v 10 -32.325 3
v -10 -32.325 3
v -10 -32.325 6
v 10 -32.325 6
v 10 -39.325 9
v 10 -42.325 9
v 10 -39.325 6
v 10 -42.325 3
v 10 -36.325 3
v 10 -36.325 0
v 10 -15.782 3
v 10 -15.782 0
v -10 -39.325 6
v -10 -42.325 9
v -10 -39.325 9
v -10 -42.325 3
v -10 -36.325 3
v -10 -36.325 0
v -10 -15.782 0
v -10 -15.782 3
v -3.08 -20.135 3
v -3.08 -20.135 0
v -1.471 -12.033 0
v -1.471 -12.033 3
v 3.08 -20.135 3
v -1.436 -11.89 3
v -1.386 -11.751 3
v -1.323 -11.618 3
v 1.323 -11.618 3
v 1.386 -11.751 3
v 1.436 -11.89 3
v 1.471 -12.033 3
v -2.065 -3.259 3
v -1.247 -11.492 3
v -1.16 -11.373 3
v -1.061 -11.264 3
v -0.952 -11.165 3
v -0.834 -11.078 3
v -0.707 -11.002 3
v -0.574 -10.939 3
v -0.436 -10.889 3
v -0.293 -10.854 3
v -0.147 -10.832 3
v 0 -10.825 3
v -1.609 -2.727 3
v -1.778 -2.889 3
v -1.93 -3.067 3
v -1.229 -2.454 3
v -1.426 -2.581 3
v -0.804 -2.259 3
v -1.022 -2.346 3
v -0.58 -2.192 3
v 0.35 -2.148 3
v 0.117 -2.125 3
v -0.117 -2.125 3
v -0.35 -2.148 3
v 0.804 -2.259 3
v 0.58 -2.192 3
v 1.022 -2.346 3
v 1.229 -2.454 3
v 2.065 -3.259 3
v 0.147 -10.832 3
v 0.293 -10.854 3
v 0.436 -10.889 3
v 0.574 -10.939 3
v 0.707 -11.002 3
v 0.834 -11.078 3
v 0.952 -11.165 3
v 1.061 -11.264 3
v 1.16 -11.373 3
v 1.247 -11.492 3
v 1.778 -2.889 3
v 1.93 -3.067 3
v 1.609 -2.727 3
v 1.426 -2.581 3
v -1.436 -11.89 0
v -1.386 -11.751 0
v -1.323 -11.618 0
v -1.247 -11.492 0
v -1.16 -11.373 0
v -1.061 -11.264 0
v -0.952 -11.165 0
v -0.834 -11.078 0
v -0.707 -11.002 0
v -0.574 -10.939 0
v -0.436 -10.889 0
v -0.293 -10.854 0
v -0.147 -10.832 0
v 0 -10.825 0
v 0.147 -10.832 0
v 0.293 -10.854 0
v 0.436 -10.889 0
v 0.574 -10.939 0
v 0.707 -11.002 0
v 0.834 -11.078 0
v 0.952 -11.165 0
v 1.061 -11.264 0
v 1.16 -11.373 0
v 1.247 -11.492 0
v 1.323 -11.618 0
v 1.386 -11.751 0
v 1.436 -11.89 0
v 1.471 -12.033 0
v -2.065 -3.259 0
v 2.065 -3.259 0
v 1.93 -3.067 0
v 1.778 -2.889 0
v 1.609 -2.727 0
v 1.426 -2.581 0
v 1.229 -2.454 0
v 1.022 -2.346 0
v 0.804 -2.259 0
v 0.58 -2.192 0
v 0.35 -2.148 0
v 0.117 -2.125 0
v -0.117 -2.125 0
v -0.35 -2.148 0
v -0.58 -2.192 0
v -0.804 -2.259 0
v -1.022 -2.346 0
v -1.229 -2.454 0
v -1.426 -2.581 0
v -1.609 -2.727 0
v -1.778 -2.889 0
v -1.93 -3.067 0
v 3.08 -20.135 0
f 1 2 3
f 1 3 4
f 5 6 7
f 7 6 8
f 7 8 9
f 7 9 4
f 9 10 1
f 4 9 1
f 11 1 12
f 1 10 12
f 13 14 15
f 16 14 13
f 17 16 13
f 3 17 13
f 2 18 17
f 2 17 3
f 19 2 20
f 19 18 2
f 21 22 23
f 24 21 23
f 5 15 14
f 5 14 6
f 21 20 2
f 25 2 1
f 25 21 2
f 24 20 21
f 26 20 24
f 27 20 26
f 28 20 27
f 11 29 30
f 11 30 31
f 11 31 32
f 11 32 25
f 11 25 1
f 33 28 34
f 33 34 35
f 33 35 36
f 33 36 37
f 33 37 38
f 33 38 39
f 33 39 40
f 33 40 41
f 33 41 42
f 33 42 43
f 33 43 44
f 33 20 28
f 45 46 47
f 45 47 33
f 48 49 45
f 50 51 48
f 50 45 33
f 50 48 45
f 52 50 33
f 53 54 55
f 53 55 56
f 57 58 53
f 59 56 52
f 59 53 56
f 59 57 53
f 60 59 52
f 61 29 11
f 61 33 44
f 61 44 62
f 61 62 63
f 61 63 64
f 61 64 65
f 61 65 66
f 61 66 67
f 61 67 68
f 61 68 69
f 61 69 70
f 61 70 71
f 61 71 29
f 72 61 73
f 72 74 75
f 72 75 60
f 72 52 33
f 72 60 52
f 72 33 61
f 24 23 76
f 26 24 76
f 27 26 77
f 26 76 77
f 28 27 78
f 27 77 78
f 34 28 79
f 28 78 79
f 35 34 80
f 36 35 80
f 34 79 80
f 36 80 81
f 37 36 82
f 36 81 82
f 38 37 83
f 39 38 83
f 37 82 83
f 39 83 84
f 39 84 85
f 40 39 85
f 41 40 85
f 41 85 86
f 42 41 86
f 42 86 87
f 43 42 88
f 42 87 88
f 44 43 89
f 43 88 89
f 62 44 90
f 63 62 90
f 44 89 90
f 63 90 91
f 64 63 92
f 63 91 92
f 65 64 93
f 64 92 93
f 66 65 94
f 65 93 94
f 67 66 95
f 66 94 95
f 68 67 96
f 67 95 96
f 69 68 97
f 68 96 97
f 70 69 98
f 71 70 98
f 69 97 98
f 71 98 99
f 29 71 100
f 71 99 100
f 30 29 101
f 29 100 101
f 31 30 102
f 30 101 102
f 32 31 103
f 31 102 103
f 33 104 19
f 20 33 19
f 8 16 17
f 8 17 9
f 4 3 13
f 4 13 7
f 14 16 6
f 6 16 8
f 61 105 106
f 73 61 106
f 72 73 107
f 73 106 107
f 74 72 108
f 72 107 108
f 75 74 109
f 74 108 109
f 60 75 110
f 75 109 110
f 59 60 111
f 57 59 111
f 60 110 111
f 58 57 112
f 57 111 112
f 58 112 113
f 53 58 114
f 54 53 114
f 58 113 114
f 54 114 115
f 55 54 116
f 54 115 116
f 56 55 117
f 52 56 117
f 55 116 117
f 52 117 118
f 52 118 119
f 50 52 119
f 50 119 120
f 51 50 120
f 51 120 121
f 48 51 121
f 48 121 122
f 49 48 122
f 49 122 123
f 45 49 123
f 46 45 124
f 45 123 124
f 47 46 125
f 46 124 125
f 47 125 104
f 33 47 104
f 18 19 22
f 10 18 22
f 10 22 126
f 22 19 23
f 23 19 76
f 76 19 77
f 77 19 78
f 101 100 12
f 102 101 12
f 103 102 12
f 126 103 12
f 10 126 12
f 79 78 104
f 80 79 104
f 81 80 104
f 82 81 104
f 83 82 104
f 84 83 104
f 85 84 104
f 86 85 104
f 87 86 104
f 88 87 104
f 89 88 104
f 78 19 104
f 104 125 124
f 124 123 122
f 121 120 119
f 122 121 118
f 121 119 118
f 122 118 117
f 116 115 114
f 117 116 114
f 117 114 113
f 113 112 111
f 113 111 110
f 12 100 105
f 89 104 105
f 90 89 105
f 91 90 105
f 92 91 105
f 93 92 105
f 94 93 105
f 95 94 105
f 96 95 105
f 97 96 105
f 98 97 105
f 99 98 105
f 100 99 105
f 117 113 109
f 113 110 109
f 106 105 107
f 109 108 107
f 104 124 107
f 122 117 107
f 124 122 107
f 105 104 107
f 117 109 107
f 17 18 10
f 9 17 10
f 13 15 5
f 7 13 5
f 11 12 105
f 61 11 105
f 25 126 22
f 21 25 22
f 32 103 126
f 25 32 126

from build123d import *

# Parameters (mm, degrees)
F1_DEPTH = 3
F2_W     = 20
F2_H     = 10
F3_DEPTH = 6
F4_W     = 20
F4_H     = 6
F5_DEPTH = 3
F6_W     = 20
F6_H     = 7
F7_DEPTH = 3


with BuildPart() as f1:
    # F0 (on Top) → F1 (new body)
    with BuildSketch(Plane.XY):
        with BuildLine():
            ThreePointArc((2.064754, -3.25858), (0, -2.122529), (-2.064754, -3.25858))
            Line((-2.064754, -3.25858), (-10, -15.781926))
            Line((-10, -15.781926), (-10, -42.324677))
            Line((-10, -42.324677), (0, -42.324677))
            Line((0, -42.324677), (10, -42.324677))
            Line((10, -42.324677), (10, -15.781926))
            Line((10, -15.781926), (2.064754, -3.25858))
        make_face()
        with BuildLine():
            ThreePointArc((-1.471273, -12.032518), (0, -10.824677), (1.471273, -12.032518))
            Line((1.471273, -12.032518), (3.080257, -20.135145))
            Line((3.080257, -20.135145), (-3.080257, -20.135145))
            Line((-3.080257, -20.135145), (-1.471273, -12.032518))
        make_face(mode=Mode.SUBTRACT)
    extrude(amount=F1_DEPTH)

    # F2 (on face) → F3 (join)
    with BuildSketch(Plane.XY.offset(3)):
        with Locations((0, -37.324677)):
            Rectangle(F2_W, F2_H)
    extrude(amount=F3_DEPTH)

    # F4 (on face) → F5 (cut)
    with BuildSketch(Plane(origin=(0, 0, 0), x_dir=(1, 0, 0), z_dir=(0, 0, -1))):
        with Locations((0, 39.324677)):
            Rectangle(F4_W, F4_H)
    extrude(amount=-F5_DEPTH, mode=Mode.SUBTRACT)

    # F6 (on face) → F7 (cut)
    with BuildSketch(Plane.XY.offset(9)):
        with Locations((0, -35.824677)):
            Rectangle(F6_W, F6_H)
    extrude(amount=-F7_DEPTH, mode=Mode.SUBTRACT)


solid = f1.part
